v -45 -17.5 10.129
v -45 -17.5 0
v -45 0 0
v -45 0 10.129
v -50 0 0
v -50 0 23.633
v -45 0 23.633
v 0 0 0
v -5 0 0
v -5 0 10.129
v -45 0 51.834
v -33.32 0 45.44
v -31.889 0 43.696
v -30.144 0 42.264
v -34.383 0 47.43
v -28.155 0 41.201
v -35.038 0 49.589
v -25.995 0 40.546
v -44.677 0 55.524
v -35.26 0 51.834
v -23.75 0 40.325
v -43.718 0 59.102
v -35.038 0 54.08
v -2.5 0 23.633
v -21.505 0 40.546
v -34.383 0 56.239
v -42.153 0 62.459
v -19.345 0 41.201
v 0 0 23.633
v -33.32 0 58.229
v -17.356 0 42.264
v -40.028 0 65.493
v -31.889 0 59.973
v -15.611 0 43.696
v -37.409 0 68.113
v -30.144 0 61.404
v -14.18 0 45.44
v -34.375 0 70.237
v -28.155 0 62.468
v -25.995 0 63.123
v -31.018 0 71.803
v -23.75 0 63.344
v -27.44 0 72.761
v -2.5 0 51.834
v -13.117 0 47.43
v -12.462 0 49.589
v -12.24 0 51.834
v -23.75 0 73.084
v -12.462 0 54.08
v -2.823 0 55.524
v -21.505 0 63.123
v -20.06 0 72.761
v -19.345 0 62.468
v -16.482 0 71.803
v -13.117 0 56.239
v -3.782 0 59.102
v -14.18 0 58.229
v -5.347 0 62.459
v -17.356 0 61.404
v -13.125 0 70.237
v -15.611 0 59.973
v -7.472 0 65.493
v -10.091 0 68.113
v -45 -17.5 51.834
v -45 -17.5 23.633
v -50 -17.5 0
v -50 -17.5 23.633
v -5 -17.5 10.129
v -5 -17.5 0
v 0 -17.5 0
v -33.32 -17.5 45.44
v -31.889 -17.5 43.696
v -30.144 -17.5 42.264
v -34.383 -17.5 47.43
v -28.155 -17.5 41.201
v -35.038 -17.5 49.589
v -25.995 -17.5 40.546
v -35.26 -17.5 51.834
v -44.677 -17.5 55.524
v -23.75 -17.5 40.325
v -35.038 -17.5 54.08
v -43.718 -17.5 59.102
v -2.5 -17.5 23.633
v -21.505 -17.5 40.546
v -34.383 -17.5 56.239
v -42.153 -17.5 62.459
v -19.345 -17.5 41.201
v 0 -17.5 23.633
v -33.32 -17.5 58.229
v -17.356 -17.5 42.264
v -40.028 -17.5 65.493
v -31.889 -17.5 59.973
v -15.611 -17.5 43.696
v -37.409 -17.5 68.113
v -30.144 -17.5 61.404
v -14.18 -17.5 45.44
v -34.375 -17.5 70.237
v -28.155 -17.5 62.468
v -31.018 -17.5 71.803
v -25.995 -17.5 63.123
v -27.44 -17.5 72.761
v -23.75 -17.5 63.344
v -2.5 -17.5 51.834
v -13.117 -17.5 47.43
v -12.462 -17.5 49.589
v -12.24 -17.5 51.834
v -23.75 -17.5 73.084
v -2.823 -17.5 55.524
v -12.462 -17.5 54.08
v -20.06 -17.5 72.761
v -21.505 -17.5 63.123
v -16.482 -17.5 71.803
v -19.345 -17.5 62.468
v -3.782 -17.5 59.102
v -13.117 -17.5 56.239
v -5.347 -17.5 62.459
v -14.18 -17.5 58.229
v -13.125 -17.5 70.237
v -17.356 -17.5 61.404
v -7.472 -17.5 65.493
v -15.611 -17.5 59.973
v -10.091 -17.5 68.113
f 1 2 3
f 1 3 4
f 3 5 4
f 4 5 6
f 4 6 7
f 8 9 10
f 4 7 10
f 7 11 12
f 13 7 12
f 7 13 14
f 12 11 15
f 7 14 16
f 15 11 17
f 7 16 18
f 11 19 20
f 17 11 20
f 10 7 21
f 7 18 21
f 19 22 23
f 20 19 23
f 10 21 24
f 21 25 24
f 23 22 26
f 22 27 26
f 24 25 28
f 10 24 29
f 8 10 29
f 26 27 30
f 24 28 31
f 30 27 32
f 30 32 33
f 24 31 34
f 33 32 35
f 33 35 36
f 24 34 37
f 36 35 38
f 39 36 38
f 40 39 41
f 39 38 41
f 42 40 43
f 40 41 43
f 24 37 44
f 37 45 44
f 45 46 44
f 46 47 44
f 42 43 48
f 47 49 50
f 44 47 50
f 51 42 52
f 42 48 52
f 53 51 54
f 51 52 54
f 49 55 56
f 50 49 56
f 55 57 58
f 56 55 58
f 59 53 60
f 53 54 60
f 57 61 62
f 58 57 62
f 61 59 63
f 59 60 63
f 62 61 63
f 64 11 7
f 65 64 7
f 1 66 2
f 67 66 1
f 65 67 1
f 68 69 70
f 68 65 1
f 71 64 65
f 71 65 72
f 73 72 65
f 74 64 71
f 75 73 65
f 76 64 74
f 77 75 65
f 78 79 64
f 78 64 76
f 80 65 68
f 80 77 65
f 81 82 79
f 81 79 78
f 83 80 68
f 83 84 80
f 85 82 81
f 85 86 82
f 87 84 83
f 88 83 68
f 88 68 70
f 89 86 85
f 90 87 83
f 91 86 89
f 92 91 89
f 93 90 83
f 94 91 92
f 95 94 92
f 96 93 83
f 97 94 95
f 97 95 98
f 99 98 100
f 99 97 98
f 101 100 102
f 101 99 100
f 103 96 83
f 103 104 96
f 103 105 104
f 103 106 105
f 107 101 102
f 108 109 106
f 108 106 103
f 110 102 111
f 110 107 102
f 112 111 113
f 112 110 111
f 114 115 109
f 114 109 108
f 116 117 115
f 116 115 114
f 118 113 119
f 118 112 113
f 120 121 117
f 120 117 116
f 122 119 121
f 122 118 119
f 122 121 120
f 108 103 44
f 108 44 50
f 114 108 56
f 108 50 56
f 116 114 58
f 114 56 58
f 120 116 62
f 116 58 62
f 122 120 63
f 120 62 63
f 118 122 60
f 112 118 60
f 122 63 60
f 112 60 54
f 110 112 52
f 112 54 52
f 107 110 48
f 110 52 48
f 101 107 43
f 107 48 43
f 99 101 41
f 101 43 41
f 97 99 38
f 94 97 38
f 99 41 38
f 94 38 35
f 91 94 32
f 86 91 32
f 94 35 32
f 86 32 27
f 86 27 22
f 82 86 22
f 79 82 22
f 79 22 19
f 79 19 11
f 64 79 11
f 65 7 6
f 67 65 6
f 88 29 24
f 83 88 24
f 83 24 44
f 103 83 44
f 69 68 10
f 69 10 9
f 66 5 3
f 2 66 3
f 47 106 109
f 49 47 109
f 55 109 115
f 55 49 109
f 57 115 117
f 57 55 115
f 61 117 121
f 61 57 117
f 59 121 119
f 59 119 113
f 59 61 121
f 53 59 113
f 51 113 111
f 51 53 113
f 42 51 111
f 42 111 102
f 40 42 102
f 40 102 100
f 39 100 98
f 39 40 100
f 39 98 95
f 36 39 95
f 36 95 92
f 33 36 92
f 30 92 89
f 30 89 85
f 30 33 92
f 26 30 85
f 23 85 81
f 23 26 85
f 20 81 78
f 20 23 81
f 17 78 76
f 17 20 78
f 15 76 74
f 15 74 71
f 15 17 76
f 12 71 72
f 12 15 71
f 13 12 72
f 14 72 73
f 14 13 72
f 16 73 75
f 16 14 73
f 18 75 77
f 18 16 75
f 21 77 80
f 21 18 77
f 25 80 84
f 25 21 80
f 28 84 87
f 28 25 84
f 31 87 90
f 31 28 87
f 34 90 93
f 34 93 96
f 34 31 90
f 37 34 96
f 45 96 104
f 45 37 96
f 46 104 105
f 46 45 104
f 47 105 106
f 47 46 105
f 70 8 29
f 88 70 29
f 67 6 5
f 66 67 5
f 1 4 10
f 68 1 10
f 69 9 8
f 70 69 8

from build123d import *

# Parameters (mm, degrees)
F0_R     = 11.509602
F1_DEPTH = 17.5


with BuildPart() as f1:
    # F0 (on Front) → F1 (new body)
    with BuildSketch(Plane.XZ):
        with BuildLine():
            Line((-5, 0), (0, 0))
            Line((0, 0), (0, 23.633176))
            Line((0, 23.633176), (-2.5, 23.633176))
            Line((-2.5, 23.633176), (-2.5, 51.83411))
            ThreePointArc((-2.5, 51.83411), (-23.75, 73.08411), (-45, 51.83411))
            Line((-45, 51.83411), (-45, 23.633176))
            Line((-45, 23.633176), (-50, 23.633176))
            Line((-50, 23.633176), (-50, 0))
            Line((-50, 0), (-45, 0))
            Line((-45, 0), (-45, 10.128504))
            Line((-45, 10.128504), (-5, 10.128504))
            Line((-5, 10.128504), (-5, 0))
        make_face()
        with Locations((-23.75, 51.83411)):
            Circle(F0_R, mode=Mode.SUBTRACT)
    extrude(amount=F1_DEPTH)


solid = f1.part
